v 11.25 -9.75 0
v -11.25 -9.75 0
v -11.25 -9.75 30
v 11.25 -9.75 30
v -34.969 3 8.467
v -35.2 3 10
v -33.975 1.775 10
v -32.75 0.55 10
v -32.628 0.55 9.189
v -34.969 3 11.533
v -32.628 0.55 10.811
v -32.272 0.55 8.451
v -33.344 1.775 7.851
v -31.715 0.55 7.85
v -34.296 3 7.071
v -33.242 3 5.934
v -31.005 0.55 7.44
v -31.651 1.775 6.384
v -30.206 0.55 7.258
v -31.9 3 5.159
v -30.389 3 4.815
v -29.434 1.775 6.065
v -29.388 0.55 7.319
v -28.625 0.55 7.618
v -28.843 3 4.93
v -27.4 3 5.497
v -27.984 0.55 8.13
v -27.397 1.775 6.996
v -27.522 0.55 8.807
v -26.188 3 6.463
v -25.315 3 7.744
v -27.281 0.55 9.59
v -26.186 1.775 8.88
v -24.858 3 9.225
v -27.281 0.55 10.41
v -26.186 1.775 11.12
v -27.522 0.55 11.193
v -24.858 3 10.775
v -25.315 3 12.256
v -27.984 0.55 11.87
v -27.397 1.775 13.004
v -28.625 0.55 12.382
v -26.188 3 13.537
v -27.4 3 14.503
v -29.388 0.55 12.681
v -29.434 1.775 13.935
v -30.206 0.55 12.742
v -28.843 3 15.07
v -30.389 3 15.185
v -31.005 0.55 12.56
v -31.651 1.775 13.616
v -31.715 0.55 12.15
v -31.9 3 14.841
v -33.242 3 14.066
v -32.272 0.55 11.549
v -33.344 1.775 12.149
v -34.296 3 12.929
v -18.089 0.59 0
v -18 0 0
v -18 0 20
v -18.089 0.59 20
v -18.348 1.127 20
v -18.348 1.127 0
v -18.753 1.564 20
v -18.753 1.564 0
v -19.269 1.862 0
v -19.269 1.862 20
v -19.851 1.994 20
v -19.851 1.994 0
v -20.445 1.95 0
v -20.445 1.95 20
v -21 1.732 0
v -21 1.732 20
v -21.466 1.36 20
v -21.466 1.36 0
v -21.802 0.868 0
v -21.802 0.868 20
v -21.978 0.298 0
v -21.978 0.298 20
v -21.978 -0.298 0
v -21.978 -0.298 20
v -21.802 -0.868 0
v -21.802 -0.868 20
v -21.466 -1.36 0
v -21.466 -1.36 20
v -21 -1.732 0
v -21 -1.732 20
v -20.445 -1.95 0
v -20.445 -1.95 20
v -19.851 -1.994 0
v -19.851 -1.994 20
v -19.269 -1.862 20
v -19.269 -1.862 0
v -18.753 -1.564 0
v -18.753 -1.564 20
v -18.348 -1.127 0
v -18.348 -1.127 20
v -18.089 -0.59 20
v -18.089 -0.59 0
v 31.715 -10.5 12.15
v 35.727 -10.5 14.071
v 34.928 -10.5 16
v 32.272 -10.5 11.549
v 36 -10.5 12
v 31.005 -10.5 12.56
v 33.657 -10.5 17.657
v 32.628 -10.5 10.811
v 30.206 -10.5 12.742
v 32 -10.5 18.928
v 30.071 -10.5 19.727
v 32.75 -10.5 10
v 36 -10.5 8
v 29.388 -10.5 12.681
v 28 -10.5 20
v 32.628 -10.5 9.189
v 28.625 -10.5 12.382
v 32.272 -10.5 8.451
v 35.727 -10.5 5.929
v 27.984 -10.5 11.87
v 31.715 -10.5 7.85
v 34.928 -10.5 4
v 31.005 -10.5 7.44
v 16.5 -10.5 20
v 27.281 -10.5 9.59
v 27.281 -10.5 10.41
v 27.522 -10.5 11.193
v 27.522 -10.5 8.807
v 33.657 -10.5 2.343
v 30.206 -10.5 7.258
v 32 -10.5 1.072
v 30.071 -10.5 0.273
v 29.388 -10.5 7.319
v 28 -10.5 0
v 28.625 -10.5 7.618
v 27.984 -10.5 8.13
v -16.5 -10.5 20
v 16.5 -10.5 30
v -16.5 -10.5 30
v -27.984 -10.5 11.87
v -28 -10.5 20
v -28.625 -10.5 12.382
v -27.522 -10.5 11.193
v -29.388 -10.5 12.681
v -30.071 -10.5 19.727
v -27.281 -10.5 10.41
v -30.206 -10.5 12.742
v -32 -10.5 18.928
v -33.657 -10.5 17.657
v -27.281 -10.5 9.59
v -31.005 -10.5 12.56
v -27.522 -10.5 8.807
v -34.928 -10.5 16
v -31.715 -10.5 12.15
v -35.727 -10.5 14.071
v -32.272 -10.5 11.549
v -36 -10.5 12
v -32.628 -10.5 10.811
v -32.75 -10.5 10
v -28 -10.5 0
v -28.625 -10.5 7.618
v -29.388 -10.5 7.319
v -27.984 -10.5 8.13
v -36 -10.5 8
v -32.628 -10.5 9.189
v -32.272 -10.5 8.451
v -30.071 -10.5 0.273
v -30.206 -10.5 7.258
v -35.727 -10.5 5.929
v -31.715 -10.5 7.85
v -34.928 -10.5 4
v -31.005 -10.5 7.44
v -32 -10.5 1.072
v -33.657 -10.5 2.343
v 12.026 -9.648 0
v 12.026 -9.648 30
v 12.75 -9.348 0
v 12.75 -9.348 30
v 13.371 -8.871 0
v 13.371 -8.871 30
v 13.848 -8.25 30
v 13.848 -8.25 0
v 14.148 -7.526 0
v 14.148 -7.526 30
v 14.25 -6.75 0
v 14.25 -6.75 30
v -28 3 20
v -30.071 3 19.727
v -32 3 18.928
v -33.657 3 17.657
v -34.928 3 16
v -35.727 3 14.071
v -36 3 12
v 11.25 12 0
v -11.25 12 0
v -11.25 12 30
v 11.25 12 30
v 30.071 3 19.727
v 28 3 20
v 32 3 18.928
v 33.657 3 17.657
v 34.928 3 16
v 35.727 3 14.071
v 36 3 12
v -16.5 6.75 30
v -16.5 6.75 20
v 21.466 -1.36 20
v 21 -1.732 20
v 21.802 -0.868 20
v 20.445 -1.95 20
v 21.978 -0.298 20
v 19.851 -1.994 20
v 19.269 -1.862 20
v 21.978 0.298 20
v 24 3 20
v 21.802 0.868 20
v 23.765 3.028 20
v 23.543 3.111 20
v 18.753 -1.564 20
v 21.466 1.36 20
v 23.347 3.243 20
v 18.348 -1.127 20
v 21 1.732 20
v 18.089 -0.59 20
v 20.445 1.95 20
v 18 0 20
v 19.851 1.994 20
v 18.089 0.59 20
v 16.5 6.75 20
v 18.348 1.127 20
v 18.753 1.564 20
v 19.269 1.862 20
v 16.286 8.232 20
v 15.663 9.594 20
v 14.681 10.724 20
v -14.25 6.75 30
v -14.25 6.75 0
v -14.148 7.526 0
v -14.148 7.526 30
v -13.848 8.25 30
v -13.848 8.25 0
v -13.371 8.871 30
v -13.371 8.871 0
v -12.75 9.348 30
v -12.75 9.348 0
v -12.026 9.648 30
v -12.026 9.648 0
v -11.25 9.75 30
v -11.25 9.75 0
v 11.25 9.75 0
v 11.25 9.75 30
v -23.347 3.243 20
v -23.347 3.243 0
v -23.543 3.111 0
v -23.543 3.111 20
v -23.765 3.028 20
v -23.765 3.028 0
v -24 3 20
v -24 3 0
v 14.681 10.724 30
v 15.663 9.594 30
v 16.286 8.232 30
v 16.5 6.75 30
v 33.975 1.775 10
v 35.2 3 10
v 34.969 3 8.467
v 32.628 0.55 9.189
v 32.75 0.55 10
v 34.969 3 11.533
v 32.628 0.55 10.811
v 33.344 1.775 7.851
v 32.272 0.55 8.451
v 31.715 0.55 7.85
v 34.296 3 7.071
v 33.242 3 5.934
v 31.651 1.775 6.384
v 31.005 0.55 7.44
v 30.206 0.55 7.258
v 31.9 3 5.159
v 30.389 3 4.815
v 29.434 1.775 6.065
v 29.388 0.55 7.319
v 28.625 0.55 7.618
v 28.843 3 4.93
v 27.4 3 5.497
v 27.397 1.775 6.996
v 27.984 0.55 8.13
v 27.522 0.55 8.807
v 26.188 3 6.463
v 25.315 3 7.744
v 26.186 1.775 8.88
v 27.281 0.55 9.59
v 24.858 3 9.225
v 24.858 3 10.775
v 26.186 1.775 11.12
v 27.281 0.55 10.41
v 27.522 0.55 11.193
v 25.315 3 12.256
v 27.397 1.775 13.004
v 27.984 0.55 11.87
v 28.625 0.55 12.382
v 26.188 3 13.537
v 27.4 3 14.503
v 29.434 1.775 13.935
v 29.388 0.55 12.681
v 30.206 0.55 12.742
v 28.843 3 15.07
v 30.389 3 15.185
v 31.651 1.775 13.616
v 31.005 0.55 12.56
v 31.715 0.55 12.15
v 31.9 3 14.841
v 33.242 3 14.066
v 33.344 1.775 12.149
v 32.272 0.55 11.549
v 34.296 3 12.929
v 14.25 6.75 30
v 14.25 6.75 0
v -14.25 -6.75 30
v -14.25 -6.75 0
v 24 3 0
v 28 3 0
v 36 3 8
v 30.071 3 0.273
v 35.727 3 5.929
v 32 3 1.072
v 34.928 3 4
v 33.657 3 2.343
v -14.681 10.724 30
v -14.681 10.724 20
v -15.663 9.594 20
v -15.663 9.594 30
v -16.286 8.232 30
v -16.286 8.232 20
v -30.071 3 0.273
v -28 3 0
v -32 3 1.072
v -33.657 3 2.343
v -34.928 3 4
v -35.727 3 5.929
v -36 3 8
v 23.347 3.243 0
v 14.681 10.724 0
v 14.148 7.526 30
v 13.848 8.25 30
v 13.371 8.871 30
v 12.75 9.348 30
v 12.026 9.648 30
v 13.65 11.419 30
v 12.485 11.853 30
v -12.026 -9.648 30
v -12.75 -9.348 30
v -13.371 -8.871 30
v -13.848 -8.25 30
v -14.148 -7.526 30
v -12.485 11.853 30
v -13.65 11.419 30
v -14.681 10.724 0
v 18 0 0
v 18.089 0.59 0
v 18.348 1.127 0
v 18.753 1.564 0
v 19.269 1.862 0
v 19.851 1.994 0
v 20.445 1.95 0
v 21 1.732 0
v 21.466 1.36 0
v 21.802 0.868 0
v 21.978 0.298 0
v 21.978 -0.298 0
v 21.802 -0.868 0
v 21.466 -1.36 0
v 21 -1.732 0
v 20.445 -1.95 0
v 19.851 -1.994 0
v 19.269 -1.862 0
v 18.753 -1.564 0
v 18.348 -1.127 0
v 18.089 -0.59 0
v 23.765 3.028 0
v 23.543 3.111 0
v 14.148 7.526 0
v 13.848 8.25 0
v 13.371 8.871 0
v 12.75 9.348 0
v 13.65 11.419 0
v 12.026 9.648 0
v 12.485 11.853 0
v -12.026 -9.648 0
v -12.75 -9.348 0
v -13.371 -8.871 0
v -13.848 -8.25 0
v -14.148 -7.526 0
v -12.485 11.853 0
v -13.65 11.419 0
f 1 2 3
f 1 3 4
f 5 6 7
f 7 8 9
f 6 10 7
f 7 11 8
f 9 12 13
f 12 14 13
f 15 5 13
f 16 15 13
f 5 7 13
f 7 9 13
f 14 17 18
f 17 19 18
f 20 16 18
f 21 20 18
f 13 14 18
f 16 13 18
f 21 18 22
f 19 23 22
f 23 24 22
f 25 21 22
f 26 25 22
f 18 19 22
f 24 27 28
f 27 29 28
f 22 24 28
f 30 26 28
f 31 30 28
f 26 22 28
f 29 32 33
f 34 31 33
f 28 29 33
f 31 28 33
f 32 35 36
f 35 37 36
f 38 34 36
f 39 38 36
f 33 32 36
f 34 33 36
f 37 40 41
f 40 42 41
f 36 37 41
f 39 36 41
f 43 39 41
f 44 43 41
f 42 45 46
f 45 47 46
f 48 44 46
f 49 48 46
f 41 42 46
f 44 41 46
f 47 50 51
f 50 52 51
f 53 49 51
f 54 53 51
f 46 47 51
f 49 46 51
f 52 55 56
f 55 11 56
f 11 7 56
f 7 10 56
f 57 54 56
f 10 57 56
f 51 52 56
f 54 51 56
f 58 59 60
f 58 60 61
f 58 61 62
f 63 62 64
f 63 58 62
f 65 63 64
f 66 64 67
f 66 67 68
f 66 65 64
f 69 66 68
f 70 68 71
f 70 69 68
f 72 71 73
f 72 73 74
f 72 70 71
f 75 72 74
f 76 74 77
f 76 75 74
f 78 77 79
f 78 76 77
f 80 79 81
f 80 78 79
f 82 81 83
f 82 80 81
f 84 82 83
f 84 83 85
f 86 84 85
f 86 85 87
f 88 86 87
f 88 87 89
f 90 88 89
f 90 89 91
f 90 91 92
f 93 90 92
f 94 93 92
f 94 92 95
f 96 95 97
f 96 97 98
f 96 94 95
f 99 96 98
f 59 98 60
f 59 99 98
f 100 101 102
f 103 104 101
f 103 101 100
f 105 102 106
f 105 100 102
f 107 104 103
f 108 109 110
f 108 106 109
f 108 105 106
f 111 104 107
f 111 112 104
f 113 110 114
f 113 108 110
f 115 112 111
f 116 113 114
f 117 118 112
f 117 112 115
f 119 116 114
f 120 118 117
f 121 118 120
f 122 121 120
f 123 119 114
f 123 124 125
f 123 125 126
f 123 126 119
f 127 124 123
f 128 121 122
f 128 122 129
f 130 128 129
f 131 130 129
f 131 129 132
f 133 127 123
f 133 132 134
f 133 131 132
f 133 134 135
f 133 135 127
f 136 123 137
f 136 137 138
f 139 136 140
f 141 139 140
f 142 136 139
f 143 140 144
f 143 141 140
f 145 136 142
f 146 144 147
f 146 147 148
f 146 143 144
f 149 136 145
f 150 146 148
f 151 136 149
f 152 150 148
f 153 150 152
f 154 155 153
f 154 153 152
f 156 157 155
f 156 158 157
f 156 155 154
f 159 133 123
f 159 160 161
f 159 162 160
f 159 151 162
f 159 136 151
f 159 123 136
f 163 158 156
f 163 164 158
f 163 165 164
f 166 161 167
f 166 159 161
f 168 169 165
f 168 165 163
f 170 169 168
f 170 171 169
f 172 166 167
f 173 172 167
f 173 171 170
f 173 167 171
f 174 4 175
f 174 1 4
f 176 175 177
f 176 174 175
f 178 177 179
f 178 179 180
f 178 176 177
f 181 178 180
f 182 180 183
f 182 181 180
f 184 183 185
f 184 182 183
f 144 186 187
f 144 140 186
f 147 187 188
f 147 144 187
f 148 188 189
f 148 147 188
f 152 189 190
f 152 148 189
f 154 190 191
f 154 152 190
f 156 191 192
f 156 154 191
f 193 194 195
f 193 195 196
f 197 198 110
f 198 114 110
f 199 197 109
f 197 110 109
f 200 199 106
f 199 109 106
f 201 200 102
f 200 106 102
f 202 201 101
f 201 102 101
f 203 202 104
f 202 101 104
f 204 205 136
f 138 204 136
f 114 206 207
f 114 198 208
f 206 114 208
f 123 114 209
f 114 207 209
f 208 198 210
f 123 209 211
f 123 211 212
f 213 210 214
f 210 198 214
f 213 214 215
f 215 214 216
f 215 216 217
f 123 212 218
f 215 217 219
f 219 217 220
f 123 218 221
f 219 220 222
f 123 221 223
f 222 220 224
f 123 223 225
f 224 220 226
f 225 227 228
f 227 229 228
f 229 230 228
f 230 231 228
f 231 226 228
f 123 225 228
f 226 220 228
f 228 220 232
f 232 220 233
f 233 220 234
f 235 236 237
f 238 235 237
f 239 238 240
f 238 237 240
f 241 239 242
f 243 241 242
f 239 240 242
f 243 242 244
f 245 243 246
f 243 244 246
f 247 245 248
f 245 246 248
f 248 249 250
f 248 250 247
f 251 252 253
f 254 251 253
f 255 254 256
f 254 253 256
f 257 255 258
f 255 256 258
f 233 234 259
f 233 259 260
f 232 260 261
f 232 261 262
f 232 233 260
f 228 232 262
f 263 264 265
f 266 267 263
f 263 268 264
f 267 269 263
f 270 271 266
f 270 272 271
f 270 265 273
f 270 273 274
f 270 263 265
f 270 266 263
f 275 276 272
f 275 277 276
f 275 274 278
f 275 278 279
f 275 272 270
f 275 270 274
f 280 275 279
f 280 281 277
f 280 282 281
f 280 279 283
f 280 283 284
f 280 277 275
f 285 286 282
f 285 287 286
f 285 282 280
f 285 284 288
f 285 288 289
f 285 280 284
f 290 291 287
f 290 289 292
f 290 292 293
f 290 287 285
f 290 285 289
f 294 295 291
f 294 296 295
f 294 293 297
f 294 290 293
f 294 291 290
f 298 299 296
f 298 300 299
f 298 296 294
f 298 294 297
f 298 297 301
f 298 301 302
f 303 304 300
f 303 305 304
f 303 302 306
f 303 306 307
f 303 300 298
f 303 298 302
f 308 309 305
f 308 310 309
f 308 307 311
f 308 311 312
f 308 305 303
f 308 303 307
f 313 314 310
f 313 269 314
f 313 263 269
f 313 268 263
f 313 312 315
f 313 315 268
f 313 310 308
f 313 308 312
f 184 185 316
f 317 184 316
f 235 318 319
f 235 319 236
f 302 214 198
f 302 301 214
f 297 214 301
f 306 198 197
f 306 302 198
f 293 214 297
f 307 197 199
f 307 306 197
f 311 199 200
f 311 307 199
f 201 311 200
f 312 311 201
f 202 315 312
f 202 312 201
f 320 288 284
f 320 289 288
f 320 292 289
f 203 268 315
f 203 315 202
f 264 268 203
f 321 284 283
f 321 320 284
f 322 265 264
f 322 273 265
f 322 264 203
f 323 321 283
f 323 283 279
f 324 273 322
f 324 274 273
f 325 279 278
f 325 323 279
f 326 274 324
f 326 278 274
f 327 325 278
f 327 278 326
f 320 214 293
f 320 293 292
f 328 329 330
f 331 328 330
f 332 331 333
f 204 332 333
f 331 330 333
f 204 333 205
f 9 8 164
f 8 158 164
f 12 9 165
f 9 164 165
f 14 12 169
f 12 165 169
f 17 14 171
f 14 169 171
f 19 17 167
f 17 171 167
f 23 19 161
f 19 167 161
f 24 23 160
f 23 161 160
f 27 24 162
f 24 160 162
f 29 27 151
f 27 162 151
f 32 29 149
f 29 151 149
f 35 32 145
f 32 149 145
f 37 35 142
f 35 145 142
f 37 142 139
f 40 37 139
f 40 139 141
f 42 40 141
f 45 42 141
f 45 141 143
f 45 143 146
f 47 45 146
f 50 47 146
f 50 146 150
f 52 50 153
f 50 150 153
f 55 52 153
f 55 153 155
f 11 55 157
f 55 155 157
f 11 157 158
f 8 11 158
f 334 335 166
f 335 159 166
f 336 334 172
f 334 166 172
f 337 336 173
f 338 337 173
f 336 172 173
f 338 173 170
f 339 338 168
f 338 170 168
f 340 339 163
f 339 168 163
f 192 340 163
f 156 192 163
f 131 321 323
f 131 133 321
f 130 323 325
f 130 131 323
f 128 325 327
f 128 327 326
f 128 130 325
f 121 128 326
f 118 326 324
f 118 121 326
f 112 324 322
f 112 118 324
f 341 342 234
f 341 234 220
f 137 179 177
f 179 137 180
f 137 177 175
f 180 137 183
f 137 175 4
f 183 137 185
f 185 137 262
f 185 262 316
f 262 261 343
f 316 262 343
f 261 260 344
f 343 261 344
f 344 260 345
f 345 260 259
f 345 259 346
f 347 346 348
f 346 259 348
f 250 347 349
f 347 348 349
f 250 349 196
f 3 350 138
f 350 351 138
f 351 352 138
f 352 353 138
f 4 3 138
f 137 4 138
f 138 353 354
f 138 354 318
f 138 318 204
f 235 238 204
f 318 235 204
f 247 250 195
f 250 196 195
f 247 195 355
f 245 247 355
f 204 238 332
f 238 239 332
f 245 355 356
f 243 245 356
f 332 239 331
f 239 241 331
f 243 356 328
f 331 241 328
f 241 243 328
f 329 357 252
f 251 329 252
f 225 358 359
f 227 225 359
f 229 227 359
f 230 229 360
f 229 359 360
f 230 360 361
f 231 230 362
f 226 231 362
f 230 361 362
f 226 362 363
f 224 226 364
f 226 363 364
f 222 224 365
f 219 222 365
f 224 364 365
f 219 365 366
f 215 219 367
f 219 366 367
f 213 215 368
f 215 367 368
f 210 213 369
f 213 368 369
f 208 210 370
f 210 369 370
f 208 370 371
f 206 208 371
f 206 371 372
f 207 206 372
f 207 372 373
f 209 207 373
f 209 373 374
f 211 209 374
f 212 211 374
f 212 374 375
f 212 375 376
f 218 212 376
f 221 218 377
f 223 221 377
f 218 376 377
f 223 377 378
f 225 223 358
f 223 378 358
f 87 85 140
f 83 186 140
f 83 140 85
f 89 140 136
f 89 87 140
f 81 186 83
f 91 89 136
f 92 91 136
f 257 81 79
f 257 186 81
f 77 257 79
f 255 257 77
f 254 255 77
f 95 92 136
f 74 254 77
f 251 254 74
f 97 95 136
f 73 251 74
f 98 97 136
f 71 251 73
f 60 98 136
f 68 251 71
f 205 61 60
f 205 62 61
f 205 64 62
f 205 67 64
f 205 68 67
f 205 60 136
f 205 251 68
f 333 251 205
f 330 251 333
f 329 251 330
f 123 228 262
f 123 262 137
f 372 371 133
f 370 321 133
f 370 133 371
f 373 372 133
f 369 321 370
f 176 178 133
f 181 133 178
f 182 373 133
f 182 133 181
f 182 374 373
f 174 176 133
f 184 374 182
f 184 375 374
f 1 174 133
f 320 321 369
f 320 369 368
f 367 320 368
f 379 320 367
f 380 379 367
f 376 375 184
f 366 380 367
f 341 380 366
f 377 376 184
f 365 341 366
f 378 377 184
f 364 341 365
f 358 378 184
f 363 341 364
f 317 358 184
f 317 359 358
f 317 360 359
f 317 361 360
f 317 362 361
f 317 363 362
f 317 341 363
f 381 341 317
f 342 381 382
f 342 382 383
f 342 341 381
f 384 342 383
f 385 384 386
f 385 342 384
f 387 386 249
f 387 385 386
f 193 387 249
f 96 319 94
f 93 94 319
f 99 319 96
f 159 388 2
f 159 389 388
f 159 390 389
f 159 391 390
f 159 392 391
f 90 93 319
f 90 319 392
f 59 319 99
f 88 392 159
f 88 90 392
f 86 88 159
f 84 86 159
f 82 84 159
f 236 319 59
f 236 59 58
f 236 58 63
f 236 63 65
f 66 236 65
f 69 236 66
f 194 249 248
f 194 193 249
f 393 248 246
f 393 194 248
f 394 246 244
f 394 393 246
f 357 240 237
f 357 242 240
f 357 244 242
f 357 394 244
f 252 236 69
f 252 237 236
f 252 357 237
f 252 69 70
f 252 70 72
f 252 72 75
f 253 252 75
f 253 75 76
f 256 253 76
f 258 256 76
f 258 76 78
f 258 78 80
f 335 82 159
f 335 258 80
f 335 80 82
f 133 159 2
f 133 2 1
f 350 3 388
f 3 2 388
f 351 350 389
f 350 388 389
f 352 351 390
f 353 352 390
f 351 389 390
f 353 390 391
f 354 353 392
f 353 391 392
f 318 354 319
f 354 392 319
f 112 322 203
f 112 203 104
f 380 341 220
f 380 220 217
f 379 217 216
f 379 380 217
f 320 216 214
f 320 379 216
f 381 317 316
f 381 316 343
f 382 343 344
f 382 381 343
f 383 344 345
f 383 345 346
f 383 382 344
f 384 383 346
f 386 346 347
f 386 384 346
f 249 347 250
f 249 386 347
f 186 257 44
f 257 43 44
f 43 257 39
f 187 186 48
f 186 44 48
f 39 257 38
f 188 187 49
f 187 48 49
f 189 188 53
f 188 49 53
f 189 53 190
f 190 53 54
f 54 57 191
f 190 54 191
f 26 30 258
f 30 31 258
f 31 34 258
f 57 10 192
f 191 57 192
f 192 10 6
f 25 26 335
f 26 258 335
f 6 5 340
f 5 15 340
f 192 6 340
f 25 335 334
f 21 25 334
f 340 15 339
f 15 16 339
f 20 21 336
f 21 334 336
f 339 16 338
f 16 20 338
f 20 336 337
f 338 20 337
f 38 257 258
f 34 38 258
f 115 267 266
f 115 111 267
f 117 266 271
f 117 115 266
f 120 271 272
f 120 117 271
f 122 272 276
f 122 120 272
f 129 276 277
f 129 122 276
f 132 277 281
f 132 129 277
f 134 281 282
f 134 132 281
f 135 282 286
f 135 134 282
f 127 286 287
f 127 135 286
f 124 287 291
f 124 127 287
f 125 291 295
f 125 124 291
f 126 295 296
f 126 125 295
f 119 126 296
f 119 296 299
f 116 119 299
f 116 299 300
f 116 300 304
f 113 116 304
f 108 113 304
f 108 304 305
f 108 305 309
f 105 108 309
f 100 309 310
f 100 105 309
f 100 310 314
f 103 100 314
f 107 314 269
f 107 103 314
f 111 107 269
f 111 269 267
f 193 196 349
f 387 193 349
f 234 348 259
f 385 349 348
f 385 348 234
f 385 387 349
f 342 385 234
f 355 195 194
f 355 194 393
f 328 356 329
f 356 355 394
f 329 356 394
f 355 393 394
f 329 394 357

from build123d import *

# Parameters (mm, degrees)
SKETCH1_R                                       = 2
BOSS_EXTRUDE1_DEPTH                             = 20
CSK_FOR_M5_FLAT_HEAD_MACHINE_SCREW1_D           = 5.5
CSK_FOR_M5_FLAT_HEAD_MACHINE_SCREW1_CSINK_D     = 10.4
CSK_FOR_M5_FLAT_HEAD_MACHINE_SCREW1_CSINK_ANGLE = 90
BOSS_EXTRUDE2_DEPTH                             = 10
FILLET3_R                                       = 8


with BuildPart() as part:
    # Sketch1 → Boss-Extrude1 (new body)
    with BuildSketch(Plane.XY):
        with BuildLine():
            Line((0, -9.75), (-11.25, -9.75))
            ThreePointArc((-11.25, -9.75), (-13.371320344, -8.871320344), (-14.25, -6.75))
            Line((-14.25, -6.75), (-14.25, 6.75))
            ThreePointArc((-14.25, 6.75), (-13.371320344, 8.871320344), (-11.25, 9.75))
            Line((-11.25, 9.75), (0, 9.75))
            Line((0, 9.75), (0, 12))
            Line((0, 12), (-11.25, 12))
            ThreePointArc((-11.25, 12), (-13.080137287, 11.670680594), (-14.680674679, 10.724037147))
            Line((-14.680674679, 10.724037147), (-23.346538156, 3.243040543))
            ThreePointArc((-23.346538156, 3.243040543), (-23.651402422, 3.062727506), (-24, 3))
            Line((-24, 3), (-36, 3))
            Line((-36, 3), (-36, -10.5))
            Line((-36, -10.5), (0, -10.5))
            Line((0, -10.5), (0, -9.75))
        make_face()
        with Locations((-20, 0)):
            Circle(SKETCH1_R, mode=Mode.SUBTRACT)
    extrude(amount=BOSS_EXTRUDE1_DEPTH)

    # CSK for M5 Flat Head Machine Screw1 (through all)
    with Locations(Plane(origin=(0, 3, 0), x_dir=(1, 0, 0), z_dir=(0, 1, 0))):
        with Locations((-30, -10)):
            CounterSinkHole(CSK_FOR_M5_FLAT_HEAD_MACHINE_SCREW1_D / 2, CSK_FOR_M5_FLAT_HEAD_MACHINE_SCREW1_CSINK_D / 2, counter_sink_angle=CSK_FOR_M5_FLAT_HEAD_MACHINE_SCREW1_CSINK_ANGLE)

    # Sketch7 → Boss-Extrude2 (add)
    with BuildSketch(Plane.XY.offset(20)):
        with BuildLine():
            Line((0, 9.75), (0, 12))
            Line((0, 12), (-11.25, 12))
            ThreePointArc((-11.25, 12), (-13.080137287, 11.670680594), (-14.680674679, 10.724037147))
            ThreePointArc((-14.680674679, 10.724037147), (-16.023549102, 8.93534413), (-16.5, 6.75))
            Line((-16.5, 6.75), (-16.5, -10.5))
            Line((-16.5, -10.5), (0, -10.5))
            Line((0, -10.5), (0, -9.75))
            Line((0, -9.75), (-11.25, -9.75))
            ThreePointArc((-11.25, -9.75), (-13.371320344, -8.871320344), (-14.25, -6.75))
            Line((-14.25, -6.75), (-14.25, 6.75))
            ThreePointArc((-14.25, 6.75), (-13.371320344, 8.871320344), (-11.25, 9.75))
            Line((-11.25, 9.75), (0, 9.75))
        make_face()
    extrude(amount=BOSS_EXTRUDE2_DEPTH)

    # Fillet3
    fillet3_edges = [part.edges().sort_by_distance(p)[0] for p in [
        (-36, -3.75, 0),
        (-36, -3.75, 20),
    ]]
    fillet(fillet3_edges, radius=FILLET3_R)

    # Mirror1: part across plane


with BuildPart() as part_1:
    add(part.part)
    add(part.part.mirror(Plane(origin=(0, 0, 0), x_dir=(0, 0, 1), z_dir=(1, 0, 0))))


solid = part_1.part
